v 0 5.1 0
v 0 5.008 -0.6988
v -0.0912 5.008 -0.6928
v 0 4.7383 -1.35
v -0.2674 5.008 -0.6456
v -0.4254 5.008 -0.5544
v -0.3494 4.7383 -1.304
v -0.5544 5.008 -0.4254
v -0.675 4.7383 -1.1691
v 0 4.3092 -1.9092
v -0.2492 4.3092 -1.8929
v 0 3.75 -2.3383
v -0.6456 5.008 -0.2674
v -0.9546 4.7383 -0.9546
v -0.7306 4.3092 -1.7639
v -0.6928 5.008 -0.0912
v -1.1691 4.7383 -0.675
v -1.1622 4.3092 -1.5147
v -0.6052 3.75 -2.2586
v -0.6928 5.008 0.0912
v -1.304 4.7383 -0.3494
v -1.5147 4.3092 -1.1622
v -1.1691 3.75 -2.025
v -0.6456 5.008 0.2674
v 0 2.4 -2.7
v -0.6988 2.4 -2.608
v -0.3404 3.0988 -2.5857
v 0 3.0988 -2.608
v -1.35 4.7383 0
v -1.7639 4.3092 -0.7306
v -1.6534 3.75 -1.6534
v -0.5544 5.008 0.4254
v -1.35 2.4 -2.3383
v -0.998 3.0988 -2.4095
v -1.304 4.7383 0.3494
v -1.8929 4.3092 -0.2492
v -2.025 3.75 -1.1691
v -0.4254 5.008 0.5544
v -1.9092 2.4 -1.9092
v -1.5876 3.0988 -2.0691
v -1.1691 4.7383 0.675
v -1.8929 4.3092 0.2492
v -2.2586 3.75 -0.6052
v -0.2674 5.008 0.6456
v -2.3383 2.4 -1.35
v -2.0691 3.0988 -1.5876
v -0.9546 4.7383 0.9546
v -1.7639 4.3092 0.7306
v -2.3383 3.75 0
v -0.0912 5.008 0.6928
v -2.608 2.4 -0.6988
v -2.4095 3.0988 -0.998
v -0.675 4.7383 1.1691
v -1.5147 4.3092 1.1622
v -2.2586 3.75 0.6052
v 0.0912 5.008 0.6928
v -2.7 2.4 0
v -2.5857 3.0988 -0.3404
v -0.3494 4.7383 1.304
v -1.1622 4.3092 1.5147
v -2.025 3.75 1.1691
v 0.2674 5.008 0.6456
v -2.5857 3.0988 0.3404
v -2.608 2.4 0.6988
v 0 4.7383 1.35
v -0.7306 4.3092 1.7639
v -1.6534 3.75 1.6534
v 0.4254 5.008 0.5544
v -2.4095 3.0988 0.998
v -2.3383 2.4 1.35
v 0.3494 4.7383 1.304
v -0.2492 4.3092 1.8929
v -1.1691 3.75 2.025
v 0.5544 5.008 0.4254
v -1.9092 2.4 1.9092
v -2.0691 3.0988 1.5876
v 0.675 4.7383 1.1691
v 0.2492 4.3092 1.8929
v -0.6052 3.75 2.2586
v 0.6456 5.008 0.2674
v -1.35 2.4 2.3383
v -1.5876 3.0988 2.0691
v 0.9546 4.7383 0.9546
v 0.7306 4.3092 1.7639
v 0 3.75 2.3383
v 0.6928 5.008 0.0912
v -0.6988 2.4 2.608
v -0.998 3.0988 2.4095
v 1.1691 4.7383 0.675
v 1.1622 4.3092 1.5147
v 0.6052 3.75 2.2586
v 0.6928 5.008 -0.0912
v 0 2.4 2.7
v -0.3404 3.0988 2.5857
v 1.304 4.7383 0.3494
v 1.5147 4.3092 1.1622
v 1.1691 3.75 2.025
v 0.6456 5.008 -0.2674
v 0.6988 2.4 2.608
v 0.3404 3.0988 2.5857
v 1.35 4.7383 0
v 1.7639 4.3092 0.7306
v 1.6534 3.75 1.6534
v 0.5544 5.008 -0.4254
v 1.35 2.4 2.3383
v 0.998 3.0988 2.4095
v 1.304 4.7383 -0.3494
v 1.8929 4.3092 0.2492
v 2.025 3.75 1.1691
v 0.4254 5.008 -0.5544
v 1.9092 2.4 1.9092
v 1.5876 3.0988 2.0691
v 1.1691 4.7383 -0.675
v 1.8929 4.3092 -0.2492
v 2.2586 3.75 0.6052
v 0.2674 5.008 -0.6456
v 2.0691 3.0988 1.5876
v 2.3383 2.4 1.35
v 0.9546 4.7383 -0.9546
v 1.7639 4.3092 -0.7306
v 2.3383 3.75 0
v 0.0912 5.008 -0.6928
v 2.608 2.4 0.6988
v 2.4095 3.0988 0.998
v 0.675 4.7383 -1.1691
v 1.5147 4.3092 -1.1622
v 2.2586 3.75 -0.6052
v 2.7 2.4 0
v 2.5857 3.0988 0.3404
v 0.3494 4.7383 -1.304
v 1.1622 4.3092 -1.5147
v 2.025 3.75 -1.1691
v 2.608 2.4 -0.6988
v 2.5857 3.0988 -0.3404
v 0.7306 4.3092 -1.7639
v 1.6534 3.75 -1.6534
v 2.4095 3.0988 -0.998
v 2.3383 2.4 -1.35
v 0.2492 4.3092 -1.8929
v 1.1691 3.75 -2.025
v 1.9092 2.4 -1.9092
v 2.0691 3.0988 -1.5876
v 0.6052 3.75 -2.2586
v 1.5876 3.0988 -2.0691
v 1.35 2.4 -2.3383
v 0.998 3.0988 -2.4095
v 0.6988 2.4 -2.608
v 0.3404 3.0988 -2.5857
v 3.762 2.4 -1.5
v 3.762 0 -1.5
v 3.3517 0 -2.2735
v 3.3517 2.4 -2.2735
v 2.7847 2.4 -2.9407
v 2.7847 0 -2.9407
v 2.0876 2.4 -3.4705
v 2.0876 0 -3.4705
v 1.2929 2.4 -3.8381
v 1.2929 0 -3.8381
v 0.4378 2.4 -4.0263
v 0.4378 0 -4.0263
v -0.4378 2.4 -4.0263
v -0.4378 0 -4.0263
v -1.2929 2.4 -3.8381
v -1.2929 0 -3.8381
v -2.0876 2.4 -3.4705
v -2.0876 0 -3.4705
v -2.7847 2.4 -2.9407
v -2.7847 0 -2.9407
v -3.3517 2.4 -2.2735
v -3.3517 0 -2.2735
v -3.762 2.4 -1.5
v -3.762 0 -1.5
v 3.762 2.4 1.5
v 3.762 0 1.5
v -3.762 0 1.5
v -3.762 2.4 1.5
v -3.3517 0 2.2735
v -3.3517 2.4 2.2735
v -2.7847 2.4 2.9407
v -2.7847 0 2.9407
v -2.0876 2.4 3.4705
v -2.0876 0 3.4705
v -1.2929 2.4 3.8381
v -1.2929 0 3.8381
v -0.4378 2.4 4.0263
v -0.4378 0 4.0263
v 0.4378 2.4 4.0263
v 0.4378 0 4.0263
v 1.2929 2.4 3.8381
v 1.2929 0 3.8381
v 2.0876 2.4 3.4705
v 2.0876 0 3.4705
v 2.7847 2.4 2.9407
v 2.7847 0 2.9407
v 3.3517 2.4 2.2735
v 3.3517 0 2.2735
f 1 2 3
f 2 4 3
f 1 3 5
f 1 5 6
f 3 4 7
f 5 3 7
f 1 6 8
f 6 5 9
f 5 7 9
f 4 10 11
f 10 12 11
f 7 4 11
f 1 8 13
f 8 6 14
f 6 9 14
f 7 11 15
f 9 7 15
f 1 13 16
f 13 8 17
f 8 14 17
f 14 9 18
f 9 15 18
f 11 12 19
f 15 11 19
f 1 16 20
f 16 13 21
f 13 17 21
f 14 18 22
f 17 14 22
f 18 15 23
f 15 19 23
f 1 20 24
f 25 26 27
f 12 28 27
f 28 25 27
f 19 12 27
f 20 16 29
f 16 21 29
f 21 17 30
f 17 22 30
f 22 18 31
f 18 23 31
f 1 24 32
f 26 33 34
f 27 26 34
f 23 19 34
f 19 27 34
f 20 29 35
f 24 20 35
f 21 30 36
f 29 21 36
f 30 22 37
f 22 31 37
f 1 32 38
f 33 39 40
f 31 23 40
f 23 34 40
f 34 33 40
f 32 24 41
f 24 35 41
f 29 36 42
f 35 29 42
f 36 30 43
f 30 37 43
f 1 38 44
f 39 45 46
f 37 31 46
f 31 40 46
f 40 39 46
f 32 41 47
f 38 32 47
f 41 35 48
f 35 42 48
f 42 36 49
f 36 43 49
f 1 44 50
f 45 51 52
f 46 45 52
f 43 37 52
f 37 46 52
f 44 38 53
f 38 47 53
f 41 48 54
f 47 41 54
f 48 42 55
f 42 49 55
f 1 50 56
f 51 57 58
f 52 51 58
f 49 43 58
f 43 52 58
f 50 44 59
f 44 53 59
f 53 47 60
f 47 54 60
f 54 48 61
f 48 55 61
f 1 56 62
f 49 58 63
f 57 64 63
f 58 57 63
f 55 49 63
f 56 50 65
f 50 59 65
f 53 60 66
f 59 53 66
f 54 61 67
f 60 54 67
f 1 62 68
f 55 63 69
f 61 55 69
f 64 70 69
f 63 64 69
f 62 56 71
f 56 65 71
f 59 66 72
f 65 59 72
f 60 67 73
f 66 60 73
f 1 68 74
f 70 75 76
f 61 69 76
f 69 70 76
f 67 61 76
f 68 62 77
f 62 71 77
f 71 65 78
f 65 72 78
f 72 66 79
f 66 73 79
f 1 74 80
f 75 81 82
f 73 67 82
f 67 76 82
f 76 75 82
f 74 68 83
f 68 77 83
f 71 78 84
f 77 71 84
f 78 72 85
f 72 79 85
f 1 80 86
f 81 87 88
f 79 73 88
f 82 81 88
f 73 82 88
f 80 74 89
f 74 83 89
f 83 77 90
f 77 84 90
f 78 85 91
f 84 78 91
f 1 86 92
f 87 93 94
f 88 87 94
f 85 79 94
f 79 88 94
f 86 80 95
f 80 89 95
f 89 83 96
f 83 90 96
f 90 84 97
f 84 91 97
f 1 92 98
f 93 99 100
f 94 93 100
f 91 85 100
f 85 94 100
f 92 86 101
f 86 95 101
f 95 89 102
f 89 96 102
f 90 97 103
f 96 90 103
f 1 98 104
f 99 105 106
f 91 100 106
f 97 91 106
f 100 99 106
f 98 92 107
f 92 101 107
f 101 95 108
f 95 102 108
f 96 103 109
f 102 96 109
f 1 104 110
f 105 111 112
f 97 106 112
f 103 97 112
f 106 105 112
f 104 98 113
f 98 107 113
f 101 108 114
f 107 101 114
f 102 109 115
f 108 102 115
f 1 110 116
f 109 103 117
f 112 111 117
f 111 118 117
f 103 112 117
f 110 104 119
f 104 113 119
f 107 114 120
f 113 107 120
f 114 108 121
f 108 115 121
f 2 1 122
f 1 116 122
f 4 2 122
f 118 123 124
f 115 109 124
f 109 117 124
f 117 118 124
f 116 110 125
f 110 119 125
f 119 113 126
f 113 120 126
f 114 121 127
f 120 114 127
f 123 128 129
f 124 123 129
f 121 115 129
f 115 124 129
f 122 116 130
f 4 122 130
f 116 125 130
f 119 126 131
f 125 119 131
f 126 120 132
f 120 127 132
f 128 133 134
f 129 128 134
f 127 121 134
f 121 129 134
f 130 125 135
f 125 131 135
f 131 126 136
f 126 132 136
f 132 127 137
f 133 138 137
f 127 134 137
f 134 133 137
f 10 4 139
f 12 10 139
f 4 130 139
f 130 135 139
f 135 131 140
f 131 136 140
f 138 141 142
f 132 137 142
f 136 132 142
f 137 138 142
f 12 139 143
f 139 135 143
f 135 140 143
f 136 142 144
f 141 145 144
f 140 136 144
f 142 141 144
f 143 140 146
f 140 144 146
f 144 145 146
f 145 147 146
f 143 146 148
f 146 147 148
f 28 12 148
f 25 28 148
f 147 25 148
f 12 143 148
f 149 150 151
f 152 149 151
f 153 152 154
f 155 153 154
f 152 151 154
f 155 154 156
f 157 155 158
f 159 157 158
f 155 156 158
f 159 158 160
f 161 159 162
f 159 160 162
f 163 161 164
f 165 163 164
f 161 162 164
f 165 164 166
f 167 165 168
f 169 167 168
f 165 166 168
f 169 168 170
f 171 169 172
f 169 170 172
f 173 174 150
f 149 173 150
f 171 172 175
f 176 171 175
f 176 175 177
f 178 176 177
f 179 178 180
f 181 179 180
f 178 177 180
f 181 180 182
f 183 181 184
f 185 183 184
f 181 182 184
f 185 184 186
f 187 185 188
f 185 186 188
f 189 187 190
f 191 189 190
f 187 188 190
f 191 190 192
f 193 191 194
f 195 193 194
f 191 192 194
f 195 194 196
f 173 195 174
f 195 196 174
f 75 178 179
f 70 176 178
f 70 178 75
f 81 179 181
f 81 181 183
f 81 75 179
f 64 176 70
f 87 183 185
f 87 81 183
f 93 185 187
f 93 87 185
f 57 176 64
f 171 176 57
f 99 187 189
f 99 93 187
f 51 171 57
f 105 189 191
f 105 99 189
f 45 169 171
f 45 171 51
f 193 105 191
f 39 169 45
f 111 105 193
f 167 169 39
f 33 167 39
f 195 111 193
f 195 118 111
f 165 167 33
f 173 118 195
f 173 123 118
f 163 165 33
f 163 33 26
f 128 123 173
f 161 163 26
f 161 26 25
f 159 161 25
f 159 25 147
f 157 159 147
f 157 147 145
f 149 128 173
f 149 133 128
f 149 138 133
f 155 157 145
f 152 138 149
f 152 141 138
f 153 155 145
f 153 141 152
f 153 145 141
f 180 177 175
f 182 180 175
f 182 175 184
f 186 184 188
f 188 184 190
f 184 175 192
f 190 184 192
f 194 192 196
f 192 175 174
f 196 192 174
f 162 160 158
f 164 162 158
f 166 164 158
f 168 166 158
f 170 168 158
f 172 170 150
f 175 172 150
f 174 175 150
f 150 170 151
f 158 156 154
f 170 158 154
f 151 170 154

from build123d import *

# Parameters (mm, degrees)
BOSS_EXTRUDE1_DEPTH = 2.4


with BuildPart() as part:
    # Sketch1 → Boss-Extrude1 (new body)
    with BuildSketch(Plane(origin=(0, 0, 0), x_dir=(1, 0, 0), z_dir=(0, 1, 0))):
        with BuildLine():
            Line((3.761980861, -1.5), (3.761980861, 1.5))
            ThreePointArc((3.761980861, 1.5), (0, 4.05), (-3.761980861, 1.5))
            Line((-3.761980861, 1.5), (-3.761980861, -1.5))
            ThreePointArc((-3.761980861, -1.5), (0, -4.05), (3.761980861, -1.5))
        make_face()
    extrude(amount=BOSS_EXTRUDE1_DEPTH)

    # Sketch3 → Revolve1 (revolve)
    with BuildSketch(Plane(origin=(0, 0, 0), x_dir=(0, 0, -1), z_dir=(1, 0, 0))):
        with BuildLine():
            Line((0, 2.4), (0, 5.1))
            ThreePointArc((0, 5.1), (1.909188309, 4.309188309), (2.7, 2.4))
            Line((2.7, 2.4), (0, 2.4))
        make_face()
    revolve(axis=Axis((0, 2.4, 0), (0, 1, 0)))


solid = part.part
